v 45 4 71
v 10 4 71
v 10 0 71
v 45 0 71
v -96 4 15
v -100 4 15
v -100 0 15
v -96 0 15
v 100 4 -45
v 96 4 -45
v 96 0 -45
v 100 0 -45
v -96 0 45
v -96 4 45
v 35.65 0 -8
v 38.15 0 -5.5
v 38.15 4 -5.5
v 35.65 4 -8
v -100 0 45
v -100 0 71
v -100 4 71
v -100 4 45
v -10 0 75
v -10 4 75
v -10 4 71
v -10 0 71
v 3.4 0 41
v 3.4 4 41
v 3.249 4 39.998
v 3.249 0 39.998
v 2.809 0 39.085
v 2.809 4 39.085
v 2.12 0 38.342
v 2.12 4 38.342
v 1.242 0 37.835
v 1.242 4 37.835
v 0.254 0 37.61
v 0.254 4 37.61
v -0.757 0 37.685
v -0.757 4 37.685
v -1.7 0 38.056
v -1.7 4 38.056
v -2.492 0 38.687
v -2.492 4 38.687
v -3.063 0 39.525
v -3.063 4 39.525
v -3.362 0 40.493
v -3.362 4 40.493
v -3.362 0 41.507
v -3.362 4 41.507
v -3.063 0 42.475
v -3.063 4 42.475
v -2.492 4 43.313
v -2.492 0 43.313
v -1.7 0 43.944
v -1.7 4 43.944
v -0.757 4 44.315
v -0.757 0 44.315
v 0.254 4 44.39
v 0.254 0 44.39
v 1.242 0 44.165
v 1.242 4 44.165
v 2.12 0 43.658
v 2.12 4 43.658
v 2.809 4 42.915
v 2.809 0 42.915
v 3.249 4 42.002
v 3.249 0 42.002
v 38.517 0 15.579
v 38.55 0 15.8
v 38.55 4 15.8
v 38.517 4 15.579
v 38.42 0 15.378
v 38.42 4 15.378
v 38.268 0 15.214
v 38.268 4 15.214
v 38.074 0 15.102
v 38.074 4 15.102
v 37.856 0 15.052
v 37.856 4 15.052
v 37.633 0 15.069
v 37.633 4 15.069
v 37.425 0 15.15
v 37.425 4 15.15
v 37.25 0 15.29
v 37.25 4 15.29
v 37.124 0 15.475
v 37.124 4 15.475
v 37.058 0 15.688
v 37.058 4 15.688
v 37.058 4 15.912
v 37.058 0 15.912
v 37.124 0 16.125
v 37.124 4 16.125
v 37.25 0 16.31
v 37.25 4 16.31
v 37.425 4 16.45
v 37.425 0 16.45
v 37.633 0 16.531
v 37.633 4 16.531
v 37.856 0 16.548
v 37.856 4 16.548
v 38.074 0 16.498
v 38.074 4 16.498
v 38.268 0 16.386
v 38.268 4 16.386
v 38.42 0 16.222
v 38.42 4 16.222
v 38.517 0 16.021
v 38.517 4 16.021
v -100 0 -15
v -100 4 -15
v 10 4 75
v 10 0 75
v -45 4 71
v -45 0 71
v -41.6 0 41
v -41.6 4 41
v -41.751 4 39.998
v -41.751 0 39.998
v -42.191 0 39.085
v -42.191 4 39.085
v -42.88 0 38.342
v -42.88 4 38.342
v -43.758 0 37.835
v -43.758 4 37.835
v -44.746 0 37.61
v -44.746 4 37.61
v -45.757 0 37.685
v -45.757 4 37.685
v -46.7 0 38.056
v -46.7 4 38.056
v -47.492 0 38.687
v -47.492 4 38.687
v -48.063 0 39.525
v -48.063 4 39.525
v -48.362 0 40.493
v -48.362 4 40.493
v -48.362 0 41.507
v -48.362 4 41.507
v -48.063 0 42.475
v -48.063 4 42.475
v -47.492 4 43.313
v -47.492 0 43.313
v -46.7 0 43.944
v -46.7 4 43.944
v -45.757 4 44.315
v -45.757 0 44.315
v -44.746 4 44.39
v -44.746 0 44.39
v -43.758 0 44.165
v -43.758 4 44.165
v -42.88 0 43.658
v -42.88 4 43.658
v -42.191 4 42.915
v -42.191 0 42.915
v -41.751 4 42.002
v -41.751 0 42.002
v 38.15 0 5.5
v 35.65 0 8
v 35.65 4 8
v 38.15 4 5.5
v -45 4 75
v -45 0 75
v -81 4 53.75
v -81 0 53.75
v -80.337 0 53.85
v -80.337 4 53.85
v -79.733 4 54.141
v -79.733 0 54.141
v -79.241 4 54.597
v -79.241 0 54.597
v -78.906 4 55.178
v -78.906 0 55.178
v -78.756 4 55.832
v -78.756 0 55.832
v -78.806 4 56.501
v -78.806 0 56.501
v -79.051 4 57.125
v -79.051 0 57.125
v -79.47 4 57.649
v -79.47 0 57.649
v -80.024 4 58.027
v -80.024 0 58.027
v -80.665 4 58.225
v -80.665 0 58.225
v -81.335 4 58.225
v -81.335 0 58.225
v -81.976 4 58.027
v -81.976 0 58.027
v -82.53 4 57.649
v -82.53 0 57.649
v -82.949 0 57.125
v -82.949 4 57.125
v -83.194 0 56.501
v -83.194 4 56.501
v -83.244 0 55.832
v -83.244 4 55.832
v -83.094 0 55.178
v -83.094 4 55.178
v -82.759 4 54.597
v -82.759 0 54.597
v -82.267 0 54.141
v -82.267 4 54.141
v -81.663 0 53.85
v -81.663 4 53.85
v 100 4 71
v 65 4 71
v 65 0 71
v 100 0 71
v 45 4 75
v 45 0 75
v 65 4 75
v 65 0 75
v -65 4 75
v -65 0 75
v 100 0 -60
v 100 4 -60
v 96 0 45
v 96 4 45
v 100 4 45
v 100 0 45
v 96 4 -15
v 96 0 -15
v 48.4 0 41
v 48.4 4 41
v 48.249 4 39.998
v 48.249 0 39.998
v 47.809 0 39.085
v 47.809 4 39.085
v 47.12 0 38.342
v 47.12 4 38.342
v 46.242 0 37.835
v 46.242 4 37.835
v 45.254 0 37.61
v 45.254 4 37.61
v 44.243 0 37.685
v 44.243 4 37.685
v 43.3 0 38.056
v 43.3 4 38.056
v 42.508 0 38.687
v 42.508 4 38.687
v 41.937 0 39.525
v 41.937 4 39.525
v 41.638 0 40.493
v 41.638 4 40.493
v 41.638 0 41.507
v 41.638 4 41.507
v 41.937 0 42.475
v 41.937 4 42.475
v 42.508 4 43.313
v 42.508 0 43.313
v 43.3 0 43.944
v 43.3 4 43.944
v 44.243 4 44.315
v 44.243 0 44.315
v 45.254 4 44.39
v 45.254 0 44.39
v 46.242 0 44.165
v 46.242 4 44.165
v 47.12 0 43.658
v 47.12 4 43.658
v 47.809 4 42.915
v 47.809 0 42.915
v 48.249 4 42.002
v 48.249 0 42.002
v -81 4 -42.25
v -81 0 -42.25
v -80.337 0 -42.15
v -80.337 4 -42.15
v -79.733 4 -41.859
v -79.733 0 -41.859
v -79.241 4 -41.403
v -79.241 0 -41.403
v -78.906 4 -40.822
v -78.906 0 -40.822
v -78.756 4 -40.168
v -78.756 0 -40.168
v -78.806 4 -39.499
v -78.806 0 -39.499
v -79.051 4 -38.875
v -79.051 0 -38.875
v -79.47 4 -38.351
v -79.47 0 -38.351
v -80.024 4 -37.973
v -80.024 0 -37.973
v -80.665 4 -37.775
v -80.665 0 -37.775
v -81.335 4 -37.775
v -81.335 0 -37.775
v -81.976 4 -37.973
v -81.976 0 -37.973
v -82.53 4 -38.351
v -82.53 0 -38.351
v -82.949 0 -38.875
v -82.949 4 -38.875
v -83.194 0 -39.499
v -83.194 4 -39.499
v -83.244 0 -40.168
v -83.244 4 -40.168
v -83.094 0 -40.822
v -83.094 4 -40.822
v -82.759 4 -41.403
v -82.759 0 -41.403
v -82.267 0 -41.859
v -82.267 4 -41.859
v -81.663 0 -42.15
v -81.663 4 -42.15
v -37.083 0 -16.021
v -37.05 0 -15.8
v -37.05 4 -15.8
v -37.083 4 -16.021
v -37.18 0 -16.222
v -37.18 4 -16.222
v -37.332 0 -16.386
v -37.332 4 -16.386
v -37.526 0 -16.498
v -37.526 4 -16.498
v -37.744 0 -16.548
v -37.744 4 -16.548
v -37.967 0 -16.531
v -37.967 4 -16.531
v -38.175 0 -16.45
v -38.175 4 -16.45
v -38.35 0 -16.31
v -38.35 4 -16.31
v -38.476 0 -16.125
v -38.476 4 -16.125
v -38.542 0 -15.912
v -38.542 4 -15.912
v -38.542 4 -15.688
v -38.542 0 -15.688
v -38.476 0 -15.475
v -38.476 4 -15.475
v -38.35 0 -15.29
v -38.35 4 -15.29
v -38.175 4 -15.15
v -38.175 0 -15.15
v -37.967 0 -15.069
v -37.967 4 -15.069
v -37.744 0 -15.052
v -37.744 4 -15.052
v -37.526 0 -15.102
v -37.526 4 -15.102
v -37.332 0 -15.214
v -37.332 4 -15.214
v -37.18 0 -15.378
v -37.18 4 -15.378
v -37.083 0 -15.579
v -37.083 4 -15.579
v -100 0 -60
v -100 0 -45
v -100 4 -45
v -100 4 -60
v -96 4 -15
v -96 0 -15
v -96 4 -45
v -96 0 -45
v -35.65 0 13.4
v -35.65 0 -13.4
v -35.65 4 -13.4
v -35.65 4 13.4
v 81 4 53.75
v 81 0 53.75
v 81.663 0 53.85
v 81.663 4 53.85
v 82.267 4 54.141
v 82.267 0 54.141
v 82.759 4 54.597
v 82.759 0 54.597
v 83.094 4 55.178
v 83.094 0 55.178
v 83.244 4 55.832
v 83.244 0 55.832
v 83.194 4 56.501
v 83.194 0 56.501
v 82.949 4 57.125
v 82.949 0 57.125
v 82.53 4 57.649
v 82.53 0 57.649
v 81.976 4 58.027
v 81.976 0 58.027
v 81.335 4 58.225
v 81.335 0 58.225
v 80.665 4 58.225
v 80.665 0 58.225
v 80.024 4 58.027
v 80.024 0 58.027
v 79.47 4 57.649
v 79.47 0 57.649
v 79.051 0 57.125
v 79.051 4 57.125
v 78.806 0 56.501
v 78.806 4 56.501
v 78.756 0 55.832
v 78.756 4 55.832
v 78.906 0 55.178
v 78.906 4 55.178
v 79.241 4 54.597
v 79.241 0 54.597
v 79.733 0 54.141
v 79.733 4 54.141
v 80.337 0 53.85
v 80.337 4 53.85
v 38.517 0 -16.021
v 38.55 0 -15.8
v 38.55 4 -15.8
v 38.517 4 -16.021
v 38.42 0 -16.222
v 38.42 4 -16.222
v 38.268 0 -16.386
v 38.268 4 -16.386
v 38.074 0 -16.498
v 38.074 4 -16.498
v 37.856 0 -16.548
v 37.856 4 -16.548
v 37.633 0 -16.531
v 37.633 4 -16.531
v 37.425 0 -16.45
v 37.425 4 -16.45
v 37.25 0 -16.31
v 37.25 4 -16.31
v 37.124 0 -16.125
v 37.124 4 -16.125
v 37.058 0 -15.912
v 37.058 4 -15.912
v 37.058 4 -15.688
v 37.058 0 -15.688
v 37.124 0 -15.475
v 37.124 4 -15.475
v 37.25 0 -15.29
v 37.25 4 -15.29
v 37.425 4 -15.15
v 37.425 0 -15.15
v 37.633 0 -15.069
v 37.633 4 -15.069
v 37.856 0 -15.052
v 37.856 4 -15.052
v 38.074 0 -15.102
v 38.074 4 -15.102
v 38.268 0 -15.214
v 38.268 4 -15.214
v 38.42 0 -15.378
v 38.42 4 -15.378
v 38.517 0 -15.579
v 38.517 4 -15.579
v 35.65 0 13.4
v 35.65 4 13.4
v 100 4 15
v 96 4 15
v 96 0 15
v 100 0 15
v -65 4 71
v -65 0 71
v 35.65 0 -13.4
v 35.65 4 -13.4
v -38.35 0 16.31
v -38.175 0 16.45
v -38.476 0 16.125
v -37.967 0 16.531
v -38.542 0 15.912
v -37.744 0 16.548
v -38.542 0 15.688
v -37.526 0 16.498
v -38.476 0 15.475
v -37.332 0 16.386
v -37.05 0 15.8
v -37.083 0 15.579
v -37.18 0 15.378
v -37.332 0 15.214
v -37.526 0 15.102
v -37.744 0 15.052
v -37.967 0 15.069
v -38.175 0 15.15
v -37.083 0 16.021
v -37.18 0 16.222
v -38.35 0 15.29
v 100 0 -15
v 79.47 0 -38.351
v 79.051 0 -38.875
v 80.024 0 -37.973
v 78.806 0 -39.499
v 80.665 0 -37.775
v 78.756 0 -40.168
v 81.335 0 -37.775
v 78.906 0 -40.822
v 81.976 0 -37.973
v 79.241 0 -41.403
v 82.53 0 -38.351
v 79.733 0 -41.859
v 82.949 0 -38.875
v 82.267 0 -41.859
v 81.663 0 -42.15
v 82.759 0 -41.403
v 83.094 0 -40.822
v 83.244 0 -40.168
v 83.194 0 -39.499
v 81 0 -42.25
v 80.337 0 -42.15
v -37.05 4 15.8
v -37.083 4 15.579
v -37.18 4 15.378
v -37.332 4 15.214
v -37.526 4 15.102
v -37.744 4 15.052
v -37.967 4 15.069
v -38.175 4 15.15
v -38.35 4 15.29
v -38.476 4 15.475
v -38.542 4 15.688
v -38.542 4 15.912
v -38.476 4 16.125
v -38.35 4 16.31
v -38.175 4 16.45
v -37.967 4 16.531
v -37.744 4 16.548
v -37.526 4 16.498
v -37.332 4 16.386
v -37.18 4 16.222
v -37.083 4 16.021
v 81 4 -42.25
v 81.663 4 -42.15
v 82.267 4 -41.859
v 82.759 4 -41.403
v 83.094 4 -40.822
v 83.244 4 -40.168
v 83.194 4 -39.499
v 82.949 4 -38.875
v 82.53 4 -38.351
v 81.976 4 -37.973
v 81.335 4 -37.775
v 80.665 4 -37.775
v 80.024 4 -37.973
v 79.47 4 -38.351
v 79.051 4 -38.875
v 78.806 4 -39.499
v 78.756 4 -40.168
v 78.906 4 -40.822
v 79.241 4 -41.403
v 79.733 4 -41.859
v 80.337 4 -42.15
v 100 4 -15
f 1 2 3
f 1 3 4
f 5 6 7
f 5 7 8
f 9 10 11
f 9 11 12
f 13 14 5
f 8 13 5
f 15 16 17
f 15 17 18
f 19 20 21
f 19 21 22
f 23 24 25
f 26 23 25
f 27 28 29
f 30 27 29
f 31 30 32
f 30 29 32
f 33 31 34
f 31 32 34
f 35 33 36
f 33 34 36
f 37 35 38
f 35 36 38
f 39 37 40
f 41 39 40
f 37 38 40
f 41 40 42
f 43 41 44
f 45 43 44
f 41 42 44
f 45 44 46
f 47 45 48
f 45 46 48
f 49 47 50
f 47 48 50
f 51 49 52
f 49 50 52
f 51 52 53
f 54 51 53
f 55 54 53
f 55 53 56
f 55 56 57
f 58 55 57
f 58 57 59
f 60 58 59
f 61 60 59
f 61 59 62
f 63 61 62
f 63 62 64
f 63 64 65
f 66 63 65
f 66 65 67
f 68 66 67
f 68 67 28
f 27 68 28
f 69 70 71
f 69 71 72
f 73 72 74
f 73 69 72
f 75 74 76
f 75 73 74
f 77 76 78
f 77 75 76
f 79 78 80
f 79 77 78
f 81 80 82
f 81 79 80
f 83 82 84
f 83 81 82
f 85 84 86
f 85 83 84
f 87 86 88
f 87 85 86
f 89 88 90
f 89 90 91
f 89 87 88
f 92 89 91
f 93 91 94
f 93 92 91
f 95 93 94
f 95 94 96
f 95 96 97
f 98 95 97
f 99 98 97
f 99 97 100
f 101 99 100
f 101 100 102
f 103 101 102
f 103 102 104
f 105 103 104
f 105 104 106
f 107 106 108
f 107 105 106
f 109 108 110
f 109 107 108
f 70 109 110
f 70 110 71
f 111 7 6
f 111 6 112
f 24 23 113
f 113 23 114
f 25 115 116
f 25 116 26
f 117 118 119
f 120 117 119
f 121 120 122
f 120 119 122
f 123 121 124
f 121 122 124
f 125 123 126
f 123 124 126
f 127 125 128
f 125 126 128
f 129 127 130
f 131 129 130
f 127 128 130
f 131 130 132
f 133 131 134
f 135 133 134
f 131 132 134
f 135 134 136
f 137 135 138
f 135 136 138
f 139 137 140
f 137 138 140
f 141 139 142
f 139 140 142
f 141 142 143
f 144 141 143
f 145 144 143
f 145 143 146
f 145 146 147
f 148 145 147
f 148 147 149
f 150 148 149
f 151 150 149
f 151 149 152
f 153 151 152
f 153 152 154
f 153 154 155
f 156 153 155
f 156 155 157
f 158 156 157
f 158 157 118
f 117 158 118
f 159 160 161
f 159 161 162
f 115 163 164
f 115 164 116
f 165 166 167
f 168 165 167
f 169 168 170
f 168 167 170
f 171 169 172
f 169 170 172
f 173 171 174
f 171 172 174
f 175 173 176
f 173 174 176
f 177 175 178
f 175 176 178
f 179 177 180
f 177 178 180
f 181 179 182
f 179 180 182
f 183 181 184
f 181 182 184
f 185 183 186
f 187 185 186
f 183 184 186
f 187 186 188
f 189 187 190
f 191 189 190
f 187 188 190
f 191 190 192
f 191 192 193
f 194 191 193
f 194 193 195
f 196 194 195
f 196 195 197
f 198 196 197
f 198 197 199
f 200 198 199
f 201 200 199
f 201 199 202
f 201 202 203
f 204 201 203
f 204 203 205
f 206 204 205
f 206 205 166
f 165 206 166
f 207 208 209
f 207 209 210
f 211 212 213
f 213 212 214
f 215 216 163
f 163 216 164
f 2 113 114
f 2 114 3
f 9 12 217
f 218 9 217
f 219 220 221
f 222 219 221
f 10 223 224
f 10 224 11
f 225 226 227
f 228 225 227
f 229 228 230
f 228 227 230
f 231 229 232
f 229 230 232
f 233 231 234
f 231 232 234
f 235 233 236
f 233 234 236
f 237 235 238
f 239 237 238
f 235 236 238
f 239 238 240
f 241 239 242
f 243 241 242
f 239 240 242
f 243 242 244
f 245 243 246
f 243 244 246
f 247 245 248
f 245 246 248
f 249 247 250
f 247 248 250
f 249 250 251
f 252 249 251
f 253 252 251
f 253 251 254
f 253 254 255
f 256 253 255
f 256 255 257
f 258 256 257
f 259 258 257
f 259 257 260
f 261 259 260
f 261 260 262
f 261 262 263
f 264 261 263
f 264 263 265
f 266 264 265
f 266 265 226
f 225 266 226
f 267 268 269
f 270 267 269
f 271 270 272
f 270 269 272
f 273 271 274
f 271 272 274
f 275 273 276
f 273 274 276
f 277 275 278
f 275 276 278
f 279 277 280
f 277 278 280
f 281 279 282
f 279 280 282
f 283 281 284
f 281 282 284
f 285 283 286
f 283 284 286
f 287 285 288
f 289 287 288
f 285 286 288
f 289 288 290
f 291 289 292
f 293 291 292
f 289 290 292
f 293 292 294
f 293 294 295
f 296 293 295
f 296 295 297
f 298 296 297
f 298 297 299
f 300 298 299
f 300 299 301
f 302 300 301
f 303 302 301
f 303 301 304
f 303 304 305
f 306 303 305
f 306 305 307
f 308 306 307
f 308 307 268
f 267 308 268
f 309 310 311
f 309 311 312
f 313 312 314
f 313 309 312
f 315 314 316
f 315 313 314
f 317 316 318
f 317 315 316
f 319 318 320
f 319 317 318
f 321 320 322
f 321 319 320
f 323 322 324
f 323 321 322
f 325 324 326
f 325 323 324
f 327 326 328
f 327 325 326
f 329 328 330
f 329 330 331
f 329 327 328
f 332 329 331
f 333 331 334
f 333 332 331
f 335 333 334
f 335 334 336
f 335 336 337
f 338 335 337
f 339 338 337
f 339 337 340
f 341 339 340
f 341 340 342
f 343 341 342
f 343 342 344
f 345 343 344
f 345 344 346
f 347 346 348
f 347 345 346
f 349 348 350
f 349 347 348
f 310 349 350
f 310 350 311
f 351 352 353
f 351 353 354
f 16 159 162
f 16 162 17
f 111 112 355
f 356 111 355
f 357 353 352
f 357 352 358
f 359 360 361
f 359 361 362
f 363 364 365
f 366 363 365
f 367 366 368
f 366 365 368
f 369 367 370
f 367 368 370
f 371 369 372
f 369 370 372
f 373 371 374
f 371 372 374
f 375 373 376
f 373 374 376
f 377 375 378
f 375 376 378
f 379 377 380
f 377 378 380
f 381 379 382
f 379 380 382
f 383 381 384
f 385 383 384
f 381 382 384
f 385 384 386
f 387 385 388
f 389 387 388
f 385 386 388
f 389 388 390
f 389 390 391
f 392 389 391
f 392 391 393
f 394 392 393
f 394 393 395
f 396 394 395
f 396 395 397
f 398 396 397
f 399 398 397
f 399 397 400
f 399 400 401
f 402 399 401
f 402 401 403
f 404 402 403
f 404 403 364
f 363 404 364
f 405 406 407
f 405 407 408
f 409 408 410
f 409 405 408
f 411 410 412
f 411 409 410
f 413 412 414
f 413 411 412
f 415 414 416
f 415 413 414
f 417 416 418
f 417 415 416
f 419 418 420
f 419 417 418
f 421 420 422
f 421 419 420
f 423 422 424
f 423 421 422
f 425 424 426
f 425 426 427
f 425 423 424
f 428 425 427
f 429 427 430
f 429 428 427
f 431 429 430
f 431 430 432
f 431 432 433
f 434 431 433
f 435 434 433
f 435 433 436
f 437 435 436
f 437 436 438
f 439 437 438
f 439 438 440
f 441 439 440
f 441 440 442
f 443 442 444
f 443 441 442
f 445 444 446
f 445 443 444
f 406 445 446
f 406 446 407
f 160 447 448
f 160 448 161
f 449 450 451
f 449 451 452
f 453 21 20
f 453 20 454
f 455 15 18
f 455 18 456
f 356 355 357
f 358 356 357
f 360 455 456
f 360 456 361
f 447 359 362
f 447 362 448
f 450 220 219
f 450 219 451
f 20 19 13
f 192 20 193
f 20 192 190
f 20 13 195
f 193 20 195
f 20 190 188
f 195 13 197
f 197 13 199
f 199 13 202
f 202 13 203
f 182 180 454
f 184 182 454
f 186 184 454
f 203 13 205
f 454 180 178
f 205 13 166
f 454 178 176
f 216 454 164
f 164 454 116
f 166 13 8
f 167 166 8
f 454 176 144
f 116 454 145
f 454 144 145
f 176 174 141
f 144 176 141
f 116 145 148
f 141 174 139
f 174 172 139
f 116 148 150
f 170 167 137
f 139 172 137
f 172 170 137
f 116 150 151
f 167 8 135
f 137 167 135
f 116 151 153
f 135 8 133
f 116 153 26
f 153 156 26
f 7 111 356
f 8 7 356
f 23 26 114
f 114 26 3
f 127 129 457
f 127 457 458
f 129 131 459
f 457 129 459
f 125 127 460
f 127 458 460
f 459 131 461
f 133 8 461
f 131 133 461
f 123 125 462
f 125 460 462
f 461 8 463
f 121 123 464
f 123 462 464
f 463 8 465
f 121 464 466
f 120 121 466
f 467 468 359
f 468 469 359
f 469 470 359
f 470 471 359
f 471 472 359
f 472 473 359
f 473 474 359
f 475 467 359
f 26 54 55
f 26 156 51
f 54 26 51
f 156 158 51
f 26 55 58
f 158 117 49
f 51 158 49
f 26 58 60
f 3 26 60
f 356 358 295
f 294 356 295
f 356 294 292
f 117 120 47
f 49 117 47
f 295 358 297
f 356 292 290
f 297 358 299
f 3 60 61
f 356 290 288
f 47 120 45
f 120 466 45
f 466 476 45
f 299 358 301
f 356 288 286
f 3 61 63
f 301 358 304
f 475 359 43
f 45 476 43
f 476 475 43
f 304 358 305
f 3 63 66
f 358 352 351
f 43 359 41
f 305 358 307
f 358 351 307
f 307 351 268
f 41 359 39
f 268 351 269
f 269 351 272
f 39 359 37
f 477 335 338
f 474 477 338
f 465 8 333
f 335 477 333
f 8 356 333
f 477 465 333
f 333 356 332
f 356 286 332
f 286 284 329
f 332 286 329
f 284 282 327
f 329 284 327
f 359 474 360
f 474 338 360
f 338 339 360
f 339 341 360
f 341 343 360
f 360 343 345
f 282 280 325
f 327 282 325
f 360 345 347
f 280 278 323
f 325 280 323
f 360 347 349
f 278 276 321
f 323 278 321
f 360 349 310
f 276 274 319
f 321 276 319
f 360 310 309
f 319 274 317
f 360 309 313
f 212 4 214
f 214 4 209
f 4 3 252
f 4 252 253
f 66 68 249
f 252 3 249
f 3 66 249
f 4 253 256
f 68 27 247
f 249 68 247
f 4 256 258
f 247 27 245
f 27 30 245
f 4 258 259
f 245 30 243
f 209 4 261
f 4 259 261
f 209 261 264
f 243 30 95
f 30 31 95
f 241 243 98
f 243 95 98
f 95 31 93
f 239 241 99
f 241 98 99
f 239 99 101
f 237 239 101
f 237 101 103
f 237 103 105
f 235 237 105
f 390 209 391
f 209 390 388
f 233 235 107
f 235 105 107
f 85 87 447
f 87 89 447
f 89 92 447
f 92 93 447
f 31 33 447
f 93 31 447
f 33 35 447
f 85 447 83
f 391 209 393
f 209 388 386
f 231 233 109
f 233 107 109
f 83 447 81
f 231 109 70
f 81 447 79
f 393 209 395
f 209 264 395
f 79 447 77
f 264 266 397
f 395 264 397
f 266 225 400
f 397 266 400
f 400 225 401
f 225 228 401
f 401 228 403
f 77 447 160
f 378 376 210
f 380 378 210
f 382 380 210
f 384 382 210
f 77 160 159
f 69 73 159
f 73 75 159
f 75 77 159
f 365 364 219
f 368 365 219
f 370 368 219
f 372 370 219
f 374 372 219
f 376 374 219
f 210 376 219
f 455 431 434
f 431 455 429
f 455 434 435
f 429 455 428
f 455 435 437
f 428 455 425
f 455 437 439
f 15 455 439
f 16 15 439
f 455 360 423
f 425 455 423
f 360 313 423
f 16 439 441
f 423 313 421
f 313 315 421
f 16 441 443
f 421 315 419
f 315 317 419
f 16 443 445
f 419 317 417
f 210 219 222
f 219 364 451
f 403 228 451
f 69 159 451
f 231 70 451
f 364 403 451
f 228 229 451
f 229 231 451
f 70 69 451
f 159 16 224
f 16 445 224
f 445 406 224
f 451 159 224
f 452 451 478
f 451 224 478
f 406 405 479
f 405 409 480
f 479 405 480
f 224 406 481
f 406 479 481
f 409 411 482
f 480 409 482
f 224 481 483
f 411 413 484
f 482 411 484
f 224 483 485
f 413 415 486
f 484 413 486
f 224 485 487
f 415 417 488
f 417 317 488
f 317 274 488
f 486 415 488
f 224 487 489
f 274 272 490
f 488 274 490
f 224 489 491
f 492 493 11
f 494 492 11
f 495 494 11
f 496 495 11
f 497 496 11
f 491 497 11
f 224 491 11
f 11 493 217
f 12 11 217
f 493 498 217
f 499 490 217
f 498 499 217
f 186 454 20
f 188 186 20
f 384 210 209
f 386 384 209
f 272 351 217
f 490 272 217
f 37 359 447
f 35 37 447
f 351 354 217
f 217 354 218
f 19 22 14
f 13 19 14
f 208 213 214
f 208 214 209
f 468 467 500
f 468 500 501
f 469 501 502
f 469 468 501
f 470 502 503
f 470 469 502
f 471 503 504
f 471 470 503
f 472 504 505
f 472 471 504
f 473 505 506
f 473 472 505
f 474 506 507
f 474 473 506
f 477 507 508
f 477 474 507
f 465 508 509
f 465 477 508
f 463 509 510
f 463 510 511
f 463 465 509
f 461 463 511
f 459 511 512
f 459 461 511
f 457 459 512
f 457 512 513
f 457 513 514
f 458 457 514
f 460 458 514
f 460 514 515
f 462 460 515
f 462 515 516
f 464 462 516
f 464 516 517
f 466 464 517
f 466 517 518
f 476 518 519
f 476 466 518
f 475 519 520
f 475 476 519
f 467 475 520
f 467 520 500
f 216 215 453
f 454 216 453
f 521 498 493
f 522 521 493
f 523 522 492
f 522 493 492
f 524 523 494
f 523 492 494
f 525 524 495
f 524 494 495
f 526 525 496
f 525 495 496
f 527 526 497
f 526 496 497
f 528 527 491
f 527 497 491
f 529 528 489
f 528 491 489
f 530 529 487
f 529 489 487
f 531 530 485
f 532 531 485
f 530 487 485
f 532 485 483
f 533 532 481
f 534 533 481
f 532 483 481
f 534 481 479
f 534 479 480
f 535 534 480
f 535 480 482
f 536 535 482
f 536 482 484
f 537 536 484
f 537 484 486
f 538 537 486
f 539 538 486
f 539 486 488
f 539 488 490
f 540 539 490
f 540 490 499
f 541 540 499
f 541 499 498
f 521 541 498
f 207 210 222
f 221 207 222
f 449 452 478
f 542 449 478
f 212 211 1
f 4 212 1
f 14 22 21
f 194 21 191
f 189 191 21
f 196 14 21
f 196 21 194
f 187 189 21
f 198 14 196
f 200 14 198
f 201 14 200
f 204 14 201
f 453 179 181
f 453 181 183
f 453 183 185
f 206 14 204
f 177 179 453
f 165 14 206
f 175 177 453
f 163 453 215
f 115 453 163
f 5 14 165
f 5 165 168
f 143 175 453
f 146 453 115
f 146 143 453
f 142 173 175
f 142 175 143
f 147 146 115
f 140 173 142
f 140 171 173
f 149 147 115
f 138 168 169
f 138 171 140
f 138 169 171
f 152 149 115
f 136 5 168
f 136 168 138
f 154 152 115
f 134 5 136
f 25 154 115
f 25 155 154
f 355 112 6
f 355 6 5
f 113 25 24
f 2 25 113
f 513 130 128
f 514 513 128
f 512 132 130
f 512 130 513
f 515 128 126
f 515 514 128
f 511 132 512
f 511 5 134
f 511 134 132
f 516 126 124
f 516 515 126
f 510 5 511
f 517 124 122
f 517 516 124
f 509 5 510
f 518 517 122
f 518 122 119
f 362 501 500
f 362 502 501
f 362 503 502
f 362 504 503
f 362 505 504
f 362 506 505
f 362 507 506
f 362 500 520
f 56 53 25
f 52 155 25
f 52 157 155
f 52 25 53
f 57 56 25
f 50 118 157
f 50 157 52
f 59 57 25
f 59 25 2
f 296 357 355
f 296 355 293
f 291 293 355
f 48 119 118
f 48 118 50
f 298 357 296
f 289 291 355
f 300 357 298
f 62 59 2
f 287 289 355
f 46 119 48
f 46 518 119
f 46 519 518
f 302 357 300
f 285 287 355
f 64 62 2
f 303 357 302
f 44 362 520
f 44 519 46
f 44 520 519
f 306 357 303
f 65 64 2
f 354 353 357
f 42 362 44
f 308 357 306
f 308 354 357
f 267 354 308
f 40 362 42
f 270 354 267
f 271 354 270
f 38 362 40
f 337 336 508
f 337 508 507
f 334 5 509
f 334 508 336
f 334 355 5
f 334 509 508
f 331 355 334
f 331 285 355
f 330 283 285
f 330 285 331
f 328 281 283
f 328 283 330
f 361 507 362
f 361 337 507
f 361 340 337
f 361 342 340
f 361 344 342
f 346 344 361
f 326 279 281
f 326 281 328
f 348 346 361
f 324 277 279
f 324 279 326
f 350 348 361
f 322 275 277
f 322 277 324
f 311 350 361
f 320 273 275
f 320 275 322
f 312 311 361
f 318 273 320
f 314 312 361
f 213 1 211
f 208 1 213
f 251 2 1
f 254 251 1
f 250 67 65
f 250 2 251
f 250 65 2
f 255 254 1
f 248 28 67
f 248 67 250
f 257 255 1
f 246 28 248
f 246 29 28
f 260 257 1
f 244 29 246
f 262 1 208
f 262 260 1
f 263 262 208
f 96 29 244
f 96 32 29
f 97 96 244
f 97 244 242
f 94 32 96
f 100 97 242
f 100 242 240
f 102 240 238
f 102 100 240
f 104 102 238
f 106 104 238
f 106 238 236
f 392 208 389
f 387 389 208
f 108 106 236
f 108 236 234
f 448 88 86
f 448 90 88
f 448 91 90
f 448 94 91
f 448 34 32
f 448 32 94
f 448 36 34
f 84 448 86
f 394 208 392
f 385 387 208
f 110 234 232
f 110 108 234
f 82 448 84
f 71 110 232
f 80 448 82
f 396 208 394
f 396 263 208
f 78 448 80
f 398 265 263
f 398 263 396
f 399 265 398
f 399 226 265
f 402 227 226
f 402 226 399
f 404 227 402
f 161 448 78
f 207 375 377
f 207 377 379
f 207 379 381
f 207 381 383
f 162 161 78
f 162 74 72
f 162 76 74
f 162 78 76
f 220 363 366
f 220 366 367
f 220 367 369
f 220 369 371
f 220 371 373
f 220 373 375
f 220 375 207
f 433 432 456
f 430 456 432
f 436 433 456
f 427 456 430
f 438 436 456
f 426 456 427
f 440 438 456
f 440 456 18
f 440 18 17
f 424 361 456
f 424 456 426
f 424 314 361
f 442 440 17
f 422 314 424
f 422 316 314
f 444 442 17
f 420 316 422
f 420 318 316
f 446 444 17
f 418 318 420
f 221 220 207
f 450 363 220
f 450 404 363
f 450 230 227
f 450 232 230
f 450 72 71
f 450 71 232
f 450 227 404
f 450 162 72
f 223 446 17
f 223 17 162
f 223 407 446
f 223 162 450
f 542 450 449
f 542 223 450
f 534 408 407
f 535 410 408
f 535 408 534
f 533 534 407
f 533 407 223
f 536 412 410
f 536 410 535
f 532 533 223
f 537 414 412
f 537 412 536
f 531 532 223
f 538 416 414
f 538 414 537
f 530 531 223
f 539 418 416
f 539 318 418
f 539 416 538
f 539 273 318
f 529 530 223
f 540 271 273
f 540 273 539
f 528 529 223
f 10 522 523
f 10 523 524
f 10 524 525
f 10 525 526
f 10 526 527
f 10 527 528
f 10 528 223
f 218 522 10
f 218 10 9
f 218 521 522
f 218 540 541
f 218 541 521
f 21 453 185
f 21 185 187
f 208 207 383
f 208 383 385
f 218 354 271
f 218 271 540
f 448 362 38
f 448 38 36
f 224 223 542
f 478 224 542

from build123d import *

# Parameters (mm, degrees)
ESBO_O1_W                = 200
ESBO_O1_H                = 150
ESBO_O1_R                = 0.75
RESSALTO_EXTRUS_O1_DEPTH = 4
ESBO_O2_W                = 35
ESBO_O2_H                = 4
ESBO_O2_W_2              = 4
ESBO_O2_H_2              = 30
CORTE_EXTRUS_O1_DEPTH    = 5
ESBO_O3_W                = 200
ESBO_O3_H                = 15
CORTE_EXTRUS_O2_DEPTH    = 5
FURO_COM_FOLGA_DE_M41_D  = 4.5
ESBO_O5_R                = 3.4
CORTE_EXTRUS_O3_DEPTH    = 5


with BuildPart() as part:
    # Esboço1 → Ressalto-extrusão1 (new body)
    with BuildSketch(Plane(origin=(0, 0, 0), x_dir=(1, 0, 0), z_dir=(0, 1, 0))):
        Rectangle(ESBO_O1_W, ESBO_O1_H)
        with Locations((-37.8, 15.8)):
            Circle(ESBO_O1_R, mode=Mode.SUBTRACT)
        with Locations((37.8, 15.8)):
            Circle(ESBO_O1_R, mode=Mode.SUBTRACT)
        with Locations((37.8, -15.8)):
            Circle(ESBO_O1_R, mode=Mode.SUBTRACT)
        with Locations((-37.8, -15.8)):
            Circle(ESBO_O1_R, mode=Mode.SUBTRACT)
        Polygon((-35.65, -13.4), (35.65, -13.4), (35.65, -8), (38.15, -5.5), (38.15, 5.5), (35.65, 8), (35.65, 13.4), (-35.65, 13.4), align=None, mode=Mode.SUBTRACT)
    extrude(amount=RESSALTO_EXTRUS_O1_DEPTH)

    # Esboço2 → Corte-extrusão1 (cut, through all)
    with BuildSketch(Plane(origin=(0, 4, 0), x_dir=(1, 0, 0), z_dir=(0, 1, 0))):
        with Locations((-27.5, -73)):
            Rectangle(ESBO_O2_W, ESBO_O2_H)
        with Locations((27.5, -73)):
            Rectangle(ESBO_O2_W, ESBO_O2_H)
        with Locations((82.5, -73)):
            Rectangle(ESBO_O2_W, ESBO_O2_H)
        with Locations((-82.5, -73)):
            Rectangle(ESBO_O2_W, ESBO_O2_H)
        with Locations((98, 30)):
            Rectangle(ESBO_O2_W_2, ESBO_O2_H_2)
        with Locations((98, -30)):
            Rectangle(ESBO_O2_W_2, ESBO_O2_H_2)
        with Locations((-98, 30)):
            Rectangle(ESBO_O2_W_2, ESBO_O2_H_2)
        with Locations((-98, -30)):
            Rectangle(ESBO_O2_W_2, ESBO_O2_H_2)
    extrude(amount=-CORTE_EXTRUS_O1_DEPTH, mode=Mode.SUBTRACT)

    # Esboço3 → Corte-extrusão2 (cut, through all)
    with BuildSketch(Plane(origin=(0, 4, 0), x_dir=(1, 0, 0), z_dir=(0, 1, 0))):
        with Locations((0, 67.5)):
            Rectangle(ESBO_O3_W, ESBO_O3_H)
    extrude(amount=-CORTE_EXTRUS_O2_DEPTH, mode=Mode.SUBTRACT)

    # Furo com folga de M41 (through all)
    with Locations(Plane(origin=(-81, 4, -40), x_dir=(0, 0, 1), z_dir=(0, 1, 0))):
        with Locations((0, 0), (96, 0), (96, 162), (0, 162)):
            Hole(FURO_COM_FOLGA_DE_M41_D / 2)

    # Esboço5 → Corte-extrusão3 (cut, through all)
    with BuildSketch(Plane(origin=(0, 4, 0), x_dir=(1, 0, 0), z_dir=(0, 1, 0))):
        with Locations((-45, -41)):
            Circle(ESBO_O5_R)
        with Locations((0, -41)):
            Circle(ESBO_O5_R)
        with Locations((45, -41)):
            Circle(ESBO_O5_R)
    extrude(amount=-CORTE_EXTRUS_O3_DEPTH, mode=Mode.SUBTRACT)


solid = part.part
